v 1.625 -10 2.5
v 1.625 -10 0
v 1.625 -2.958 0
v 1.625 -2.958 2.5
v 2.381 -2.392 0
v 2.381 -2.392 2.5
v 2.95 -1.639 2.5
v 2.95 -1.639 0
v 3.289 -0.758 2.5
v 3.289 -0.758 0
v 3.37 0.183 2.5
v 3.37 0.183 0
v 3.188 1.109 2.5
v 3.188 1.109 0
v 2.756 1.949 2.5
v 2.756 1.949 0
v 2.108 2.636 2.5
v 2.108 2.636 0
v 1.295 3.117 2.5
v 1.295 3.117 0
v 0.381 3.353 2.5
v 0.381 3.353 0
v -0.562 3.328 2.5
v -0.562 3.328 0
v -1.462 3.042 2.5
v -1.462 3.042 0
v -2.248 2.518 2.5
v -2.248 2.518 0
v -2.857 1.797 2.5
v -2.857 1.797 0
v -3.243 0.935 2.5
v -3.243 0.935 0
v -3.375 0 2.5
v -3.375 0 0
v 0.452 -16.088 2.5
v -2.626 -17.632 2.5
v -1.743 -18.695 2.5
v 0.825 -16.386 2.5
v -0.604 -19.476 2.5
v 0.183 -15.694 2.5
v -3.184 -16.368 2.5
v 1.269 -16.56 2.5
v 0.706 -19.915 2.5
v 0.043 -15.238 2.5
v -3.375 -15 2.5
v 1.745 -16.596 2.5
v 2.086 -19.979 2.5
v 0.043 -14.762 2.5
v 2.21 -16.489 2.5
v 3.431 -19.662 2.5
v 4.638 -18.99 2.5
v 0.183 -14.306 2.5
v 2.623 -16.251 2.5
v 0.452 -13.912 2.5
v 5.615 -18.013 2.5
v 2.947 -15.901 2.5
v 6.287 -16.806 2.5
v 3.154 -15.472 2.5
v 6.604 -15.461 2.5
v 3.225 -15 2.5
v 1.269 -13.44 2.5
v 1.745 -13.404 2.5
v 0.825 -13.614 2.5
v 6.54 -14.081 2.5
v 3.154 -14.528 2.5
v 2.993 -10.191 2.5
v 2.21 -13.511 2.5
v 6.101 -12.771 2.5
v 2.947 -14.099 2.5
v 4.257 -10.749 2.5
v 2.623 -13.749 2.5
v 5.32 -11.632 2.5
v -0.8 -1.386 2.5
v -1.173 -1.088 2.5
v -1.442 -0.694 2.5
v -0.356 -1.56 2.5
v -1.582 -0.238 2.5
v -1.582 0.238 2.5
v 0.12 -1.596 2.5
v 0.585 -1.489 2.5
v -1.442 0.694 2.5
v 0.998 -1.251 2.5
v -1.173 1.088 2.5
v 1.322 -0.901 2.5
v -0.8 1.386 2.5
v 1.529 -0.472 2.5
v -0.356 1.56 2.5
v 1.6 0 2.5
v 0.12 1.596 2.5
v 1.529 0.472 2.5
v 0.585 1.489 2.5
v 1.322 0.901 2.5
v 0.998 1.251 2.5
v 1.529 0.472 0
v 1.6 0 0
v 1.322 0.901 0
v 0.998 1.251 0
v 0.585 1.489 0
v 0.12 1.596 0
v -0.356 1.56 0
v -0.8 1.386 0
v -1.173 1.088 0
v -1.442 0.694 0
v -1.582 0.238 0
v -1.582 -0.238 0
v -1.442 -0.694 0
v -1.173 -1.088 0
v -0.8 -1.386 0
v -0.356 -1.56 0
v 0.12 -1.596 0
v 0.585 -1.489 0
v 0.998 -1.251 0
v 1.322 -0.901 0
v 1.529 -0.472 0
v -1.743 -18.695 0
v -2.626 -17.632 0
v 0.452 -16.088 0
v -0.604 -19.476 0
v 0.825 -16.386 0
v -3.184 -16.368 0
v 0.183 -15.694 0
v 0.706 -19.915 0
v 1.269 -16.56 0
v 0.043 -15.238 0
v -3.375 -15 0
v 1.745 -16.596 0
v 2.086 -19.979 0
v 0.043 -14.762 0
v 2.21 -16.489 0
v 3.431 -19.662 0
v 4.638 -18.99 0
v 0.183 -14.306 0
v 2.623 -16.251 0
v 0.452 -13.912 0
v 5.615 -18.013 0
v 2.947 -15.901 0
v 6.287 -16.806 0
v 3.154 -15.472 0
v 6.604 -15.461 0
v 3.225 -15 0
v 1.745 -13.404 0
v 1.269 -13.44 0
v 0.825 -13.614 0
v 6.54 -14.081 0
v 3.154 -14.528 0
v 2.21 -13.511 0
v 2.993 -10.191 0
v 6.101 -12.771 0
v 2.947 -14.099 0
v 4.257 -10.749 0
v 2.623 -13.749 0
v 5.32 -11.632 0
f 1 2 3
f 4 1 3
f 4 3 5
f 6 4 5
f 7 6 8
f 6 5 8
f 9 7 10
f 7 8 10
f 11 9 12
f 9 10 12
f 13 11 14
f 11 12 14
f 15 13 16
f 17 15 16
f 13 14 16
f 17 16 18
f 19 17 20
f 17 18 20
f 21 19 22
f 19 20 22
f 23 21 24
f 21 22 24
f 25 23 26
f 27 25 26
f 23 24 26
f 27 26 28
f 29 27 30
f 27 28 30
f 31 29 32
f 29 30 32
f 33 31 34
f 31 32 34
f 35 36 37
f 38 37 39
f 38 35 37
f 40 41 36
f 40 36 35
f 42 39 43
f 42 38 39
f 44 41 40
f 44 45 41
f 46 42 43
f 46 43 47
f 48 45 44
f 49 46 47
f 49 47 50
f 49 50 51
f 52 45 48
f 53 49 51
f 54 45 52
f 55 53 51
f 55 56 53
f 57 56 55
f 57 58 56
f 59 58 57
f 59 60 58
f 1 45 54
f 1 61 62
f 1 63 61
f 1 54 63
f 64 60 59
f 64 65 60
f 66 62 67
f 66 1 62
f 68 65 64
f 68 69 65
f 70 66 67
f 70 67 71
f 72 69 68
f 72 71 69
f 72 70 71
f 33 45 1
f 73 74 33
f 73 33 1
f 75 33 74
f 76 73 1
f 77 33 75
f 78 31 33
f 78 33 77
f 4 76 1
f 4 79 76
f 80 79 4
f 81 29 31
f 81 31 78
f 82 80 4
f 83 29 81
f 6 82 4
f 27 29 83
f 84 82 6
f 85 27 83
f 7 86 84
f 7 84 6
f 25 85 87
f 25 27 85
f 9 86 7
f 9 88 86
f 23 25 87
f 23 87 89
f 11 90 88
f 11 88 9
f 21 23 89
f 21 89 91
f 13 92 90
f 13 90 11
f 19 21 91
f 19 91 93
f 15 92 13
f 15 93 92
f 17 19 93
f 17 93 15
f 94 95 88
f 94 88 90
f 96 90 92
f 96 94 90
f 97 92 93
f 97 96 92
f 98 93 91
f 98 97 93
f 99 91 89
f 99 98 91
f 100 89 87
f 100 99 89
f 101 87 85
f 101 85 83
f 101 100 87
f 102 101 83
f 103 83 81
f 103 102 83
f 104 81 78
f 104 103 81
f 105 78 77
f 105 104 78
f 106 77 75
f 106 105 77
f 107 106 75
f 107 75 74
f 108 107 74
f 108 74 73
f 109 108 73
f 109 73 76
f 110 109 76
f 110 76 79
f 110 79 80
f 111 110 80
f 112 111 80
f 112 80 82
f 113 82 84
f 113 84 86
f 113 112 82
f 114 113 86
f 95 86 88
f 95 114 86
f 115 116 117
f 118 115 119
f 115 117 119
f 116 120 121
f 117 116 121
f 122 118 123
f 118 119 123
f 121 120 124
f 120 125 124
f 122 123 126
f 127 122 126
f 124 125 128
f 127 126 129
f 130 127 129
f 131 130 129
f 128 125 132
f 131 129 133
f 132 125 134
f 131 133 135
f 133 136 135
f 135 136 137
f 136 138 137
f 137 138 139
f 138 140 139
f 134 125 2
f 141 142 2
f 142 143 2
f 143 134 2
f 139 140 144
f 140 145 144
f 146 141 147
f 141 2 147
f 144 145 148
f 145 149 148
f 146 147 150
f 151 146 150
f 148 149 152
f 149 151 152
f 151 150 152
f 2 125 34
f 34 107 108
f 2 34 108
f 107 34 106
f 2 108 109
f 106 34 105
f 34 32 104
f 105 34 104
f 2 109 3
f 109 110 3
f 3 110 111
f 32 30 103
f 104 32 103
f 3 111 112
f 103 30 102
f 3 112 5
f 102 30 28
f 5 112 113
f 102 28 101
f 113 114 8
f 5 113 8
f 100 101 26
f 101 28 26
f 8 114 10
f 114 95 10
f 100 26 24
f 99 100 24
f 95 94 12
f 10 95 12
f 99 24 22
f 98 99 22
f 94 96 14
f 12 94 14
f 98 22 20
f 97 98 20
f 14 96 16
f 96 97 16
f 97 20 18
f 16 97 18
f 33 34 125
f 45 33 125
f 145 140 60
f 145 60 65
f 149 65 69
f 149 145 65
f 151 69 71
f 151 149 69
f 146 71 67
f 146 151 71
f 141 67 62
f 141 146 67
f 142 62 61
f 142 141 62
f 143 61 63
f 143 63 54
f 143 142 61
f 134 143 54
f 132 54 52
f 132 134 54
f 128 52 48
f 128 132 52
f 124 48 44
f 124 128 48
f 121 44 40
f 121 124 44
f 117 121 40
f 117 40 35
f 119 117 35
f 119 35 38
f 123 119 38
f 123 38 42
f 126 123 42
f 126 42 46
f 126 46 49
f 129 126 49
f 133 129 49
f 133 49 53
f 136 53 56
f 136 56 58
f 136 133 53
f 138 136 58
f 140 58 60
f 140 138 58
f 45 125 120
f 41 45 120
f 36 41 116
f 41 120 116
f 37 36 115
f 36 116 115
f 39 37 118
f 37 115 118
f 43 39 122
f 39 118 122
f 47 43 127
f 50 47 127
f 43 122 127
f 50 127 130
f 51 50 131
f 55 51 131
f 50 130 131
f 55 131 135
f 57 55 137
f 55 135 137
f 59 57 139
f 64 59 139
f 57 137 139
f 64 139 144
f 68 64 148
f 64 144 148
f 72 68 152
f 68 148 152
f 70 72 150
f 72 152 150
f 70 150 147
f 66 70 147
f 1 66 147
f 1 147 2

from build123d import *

# Parameters (mm, degrees)
SKETCH1_R           = 5
SKETCH1_R_2         = 1.6
SKETCH1_R_3         = 3.375
BOSS_EXTRUDE1_DEPTH = 2.5


with BuildPart() as part:
    # Sketch1 → Boss-Extrude1 (new body)
    with BuildSketch(Plane.XY):
        with Locations((1.625, -15)):
            Circle(SKETCH1_R)
        with Locations((1.625, -15)):
            Circle(SKETCH1_R_2, mode=Mode.SUBTRACT)
        with BuildLine():
            Line((-3.375, 0), (-3.375, -15))
            ThreePointArc((-3.375, -15), (-1.910533906, -11.464466094), (1.625, -10))
            Line((1.625, -10), (1.625, -2.958039892))
            ThreePointArc((1.625, -2.958039892), (-1.718465886, -2.90473751), (-3.375, 0))
        make_face()
        Circle(SKETCH1_R_3)
        Circle(SKETCH1_R_2, mode=Mode.SUBTRACT)
    extrude(amount=BOSS_EXTRUDE1_DEPTH)


solid = part.part
